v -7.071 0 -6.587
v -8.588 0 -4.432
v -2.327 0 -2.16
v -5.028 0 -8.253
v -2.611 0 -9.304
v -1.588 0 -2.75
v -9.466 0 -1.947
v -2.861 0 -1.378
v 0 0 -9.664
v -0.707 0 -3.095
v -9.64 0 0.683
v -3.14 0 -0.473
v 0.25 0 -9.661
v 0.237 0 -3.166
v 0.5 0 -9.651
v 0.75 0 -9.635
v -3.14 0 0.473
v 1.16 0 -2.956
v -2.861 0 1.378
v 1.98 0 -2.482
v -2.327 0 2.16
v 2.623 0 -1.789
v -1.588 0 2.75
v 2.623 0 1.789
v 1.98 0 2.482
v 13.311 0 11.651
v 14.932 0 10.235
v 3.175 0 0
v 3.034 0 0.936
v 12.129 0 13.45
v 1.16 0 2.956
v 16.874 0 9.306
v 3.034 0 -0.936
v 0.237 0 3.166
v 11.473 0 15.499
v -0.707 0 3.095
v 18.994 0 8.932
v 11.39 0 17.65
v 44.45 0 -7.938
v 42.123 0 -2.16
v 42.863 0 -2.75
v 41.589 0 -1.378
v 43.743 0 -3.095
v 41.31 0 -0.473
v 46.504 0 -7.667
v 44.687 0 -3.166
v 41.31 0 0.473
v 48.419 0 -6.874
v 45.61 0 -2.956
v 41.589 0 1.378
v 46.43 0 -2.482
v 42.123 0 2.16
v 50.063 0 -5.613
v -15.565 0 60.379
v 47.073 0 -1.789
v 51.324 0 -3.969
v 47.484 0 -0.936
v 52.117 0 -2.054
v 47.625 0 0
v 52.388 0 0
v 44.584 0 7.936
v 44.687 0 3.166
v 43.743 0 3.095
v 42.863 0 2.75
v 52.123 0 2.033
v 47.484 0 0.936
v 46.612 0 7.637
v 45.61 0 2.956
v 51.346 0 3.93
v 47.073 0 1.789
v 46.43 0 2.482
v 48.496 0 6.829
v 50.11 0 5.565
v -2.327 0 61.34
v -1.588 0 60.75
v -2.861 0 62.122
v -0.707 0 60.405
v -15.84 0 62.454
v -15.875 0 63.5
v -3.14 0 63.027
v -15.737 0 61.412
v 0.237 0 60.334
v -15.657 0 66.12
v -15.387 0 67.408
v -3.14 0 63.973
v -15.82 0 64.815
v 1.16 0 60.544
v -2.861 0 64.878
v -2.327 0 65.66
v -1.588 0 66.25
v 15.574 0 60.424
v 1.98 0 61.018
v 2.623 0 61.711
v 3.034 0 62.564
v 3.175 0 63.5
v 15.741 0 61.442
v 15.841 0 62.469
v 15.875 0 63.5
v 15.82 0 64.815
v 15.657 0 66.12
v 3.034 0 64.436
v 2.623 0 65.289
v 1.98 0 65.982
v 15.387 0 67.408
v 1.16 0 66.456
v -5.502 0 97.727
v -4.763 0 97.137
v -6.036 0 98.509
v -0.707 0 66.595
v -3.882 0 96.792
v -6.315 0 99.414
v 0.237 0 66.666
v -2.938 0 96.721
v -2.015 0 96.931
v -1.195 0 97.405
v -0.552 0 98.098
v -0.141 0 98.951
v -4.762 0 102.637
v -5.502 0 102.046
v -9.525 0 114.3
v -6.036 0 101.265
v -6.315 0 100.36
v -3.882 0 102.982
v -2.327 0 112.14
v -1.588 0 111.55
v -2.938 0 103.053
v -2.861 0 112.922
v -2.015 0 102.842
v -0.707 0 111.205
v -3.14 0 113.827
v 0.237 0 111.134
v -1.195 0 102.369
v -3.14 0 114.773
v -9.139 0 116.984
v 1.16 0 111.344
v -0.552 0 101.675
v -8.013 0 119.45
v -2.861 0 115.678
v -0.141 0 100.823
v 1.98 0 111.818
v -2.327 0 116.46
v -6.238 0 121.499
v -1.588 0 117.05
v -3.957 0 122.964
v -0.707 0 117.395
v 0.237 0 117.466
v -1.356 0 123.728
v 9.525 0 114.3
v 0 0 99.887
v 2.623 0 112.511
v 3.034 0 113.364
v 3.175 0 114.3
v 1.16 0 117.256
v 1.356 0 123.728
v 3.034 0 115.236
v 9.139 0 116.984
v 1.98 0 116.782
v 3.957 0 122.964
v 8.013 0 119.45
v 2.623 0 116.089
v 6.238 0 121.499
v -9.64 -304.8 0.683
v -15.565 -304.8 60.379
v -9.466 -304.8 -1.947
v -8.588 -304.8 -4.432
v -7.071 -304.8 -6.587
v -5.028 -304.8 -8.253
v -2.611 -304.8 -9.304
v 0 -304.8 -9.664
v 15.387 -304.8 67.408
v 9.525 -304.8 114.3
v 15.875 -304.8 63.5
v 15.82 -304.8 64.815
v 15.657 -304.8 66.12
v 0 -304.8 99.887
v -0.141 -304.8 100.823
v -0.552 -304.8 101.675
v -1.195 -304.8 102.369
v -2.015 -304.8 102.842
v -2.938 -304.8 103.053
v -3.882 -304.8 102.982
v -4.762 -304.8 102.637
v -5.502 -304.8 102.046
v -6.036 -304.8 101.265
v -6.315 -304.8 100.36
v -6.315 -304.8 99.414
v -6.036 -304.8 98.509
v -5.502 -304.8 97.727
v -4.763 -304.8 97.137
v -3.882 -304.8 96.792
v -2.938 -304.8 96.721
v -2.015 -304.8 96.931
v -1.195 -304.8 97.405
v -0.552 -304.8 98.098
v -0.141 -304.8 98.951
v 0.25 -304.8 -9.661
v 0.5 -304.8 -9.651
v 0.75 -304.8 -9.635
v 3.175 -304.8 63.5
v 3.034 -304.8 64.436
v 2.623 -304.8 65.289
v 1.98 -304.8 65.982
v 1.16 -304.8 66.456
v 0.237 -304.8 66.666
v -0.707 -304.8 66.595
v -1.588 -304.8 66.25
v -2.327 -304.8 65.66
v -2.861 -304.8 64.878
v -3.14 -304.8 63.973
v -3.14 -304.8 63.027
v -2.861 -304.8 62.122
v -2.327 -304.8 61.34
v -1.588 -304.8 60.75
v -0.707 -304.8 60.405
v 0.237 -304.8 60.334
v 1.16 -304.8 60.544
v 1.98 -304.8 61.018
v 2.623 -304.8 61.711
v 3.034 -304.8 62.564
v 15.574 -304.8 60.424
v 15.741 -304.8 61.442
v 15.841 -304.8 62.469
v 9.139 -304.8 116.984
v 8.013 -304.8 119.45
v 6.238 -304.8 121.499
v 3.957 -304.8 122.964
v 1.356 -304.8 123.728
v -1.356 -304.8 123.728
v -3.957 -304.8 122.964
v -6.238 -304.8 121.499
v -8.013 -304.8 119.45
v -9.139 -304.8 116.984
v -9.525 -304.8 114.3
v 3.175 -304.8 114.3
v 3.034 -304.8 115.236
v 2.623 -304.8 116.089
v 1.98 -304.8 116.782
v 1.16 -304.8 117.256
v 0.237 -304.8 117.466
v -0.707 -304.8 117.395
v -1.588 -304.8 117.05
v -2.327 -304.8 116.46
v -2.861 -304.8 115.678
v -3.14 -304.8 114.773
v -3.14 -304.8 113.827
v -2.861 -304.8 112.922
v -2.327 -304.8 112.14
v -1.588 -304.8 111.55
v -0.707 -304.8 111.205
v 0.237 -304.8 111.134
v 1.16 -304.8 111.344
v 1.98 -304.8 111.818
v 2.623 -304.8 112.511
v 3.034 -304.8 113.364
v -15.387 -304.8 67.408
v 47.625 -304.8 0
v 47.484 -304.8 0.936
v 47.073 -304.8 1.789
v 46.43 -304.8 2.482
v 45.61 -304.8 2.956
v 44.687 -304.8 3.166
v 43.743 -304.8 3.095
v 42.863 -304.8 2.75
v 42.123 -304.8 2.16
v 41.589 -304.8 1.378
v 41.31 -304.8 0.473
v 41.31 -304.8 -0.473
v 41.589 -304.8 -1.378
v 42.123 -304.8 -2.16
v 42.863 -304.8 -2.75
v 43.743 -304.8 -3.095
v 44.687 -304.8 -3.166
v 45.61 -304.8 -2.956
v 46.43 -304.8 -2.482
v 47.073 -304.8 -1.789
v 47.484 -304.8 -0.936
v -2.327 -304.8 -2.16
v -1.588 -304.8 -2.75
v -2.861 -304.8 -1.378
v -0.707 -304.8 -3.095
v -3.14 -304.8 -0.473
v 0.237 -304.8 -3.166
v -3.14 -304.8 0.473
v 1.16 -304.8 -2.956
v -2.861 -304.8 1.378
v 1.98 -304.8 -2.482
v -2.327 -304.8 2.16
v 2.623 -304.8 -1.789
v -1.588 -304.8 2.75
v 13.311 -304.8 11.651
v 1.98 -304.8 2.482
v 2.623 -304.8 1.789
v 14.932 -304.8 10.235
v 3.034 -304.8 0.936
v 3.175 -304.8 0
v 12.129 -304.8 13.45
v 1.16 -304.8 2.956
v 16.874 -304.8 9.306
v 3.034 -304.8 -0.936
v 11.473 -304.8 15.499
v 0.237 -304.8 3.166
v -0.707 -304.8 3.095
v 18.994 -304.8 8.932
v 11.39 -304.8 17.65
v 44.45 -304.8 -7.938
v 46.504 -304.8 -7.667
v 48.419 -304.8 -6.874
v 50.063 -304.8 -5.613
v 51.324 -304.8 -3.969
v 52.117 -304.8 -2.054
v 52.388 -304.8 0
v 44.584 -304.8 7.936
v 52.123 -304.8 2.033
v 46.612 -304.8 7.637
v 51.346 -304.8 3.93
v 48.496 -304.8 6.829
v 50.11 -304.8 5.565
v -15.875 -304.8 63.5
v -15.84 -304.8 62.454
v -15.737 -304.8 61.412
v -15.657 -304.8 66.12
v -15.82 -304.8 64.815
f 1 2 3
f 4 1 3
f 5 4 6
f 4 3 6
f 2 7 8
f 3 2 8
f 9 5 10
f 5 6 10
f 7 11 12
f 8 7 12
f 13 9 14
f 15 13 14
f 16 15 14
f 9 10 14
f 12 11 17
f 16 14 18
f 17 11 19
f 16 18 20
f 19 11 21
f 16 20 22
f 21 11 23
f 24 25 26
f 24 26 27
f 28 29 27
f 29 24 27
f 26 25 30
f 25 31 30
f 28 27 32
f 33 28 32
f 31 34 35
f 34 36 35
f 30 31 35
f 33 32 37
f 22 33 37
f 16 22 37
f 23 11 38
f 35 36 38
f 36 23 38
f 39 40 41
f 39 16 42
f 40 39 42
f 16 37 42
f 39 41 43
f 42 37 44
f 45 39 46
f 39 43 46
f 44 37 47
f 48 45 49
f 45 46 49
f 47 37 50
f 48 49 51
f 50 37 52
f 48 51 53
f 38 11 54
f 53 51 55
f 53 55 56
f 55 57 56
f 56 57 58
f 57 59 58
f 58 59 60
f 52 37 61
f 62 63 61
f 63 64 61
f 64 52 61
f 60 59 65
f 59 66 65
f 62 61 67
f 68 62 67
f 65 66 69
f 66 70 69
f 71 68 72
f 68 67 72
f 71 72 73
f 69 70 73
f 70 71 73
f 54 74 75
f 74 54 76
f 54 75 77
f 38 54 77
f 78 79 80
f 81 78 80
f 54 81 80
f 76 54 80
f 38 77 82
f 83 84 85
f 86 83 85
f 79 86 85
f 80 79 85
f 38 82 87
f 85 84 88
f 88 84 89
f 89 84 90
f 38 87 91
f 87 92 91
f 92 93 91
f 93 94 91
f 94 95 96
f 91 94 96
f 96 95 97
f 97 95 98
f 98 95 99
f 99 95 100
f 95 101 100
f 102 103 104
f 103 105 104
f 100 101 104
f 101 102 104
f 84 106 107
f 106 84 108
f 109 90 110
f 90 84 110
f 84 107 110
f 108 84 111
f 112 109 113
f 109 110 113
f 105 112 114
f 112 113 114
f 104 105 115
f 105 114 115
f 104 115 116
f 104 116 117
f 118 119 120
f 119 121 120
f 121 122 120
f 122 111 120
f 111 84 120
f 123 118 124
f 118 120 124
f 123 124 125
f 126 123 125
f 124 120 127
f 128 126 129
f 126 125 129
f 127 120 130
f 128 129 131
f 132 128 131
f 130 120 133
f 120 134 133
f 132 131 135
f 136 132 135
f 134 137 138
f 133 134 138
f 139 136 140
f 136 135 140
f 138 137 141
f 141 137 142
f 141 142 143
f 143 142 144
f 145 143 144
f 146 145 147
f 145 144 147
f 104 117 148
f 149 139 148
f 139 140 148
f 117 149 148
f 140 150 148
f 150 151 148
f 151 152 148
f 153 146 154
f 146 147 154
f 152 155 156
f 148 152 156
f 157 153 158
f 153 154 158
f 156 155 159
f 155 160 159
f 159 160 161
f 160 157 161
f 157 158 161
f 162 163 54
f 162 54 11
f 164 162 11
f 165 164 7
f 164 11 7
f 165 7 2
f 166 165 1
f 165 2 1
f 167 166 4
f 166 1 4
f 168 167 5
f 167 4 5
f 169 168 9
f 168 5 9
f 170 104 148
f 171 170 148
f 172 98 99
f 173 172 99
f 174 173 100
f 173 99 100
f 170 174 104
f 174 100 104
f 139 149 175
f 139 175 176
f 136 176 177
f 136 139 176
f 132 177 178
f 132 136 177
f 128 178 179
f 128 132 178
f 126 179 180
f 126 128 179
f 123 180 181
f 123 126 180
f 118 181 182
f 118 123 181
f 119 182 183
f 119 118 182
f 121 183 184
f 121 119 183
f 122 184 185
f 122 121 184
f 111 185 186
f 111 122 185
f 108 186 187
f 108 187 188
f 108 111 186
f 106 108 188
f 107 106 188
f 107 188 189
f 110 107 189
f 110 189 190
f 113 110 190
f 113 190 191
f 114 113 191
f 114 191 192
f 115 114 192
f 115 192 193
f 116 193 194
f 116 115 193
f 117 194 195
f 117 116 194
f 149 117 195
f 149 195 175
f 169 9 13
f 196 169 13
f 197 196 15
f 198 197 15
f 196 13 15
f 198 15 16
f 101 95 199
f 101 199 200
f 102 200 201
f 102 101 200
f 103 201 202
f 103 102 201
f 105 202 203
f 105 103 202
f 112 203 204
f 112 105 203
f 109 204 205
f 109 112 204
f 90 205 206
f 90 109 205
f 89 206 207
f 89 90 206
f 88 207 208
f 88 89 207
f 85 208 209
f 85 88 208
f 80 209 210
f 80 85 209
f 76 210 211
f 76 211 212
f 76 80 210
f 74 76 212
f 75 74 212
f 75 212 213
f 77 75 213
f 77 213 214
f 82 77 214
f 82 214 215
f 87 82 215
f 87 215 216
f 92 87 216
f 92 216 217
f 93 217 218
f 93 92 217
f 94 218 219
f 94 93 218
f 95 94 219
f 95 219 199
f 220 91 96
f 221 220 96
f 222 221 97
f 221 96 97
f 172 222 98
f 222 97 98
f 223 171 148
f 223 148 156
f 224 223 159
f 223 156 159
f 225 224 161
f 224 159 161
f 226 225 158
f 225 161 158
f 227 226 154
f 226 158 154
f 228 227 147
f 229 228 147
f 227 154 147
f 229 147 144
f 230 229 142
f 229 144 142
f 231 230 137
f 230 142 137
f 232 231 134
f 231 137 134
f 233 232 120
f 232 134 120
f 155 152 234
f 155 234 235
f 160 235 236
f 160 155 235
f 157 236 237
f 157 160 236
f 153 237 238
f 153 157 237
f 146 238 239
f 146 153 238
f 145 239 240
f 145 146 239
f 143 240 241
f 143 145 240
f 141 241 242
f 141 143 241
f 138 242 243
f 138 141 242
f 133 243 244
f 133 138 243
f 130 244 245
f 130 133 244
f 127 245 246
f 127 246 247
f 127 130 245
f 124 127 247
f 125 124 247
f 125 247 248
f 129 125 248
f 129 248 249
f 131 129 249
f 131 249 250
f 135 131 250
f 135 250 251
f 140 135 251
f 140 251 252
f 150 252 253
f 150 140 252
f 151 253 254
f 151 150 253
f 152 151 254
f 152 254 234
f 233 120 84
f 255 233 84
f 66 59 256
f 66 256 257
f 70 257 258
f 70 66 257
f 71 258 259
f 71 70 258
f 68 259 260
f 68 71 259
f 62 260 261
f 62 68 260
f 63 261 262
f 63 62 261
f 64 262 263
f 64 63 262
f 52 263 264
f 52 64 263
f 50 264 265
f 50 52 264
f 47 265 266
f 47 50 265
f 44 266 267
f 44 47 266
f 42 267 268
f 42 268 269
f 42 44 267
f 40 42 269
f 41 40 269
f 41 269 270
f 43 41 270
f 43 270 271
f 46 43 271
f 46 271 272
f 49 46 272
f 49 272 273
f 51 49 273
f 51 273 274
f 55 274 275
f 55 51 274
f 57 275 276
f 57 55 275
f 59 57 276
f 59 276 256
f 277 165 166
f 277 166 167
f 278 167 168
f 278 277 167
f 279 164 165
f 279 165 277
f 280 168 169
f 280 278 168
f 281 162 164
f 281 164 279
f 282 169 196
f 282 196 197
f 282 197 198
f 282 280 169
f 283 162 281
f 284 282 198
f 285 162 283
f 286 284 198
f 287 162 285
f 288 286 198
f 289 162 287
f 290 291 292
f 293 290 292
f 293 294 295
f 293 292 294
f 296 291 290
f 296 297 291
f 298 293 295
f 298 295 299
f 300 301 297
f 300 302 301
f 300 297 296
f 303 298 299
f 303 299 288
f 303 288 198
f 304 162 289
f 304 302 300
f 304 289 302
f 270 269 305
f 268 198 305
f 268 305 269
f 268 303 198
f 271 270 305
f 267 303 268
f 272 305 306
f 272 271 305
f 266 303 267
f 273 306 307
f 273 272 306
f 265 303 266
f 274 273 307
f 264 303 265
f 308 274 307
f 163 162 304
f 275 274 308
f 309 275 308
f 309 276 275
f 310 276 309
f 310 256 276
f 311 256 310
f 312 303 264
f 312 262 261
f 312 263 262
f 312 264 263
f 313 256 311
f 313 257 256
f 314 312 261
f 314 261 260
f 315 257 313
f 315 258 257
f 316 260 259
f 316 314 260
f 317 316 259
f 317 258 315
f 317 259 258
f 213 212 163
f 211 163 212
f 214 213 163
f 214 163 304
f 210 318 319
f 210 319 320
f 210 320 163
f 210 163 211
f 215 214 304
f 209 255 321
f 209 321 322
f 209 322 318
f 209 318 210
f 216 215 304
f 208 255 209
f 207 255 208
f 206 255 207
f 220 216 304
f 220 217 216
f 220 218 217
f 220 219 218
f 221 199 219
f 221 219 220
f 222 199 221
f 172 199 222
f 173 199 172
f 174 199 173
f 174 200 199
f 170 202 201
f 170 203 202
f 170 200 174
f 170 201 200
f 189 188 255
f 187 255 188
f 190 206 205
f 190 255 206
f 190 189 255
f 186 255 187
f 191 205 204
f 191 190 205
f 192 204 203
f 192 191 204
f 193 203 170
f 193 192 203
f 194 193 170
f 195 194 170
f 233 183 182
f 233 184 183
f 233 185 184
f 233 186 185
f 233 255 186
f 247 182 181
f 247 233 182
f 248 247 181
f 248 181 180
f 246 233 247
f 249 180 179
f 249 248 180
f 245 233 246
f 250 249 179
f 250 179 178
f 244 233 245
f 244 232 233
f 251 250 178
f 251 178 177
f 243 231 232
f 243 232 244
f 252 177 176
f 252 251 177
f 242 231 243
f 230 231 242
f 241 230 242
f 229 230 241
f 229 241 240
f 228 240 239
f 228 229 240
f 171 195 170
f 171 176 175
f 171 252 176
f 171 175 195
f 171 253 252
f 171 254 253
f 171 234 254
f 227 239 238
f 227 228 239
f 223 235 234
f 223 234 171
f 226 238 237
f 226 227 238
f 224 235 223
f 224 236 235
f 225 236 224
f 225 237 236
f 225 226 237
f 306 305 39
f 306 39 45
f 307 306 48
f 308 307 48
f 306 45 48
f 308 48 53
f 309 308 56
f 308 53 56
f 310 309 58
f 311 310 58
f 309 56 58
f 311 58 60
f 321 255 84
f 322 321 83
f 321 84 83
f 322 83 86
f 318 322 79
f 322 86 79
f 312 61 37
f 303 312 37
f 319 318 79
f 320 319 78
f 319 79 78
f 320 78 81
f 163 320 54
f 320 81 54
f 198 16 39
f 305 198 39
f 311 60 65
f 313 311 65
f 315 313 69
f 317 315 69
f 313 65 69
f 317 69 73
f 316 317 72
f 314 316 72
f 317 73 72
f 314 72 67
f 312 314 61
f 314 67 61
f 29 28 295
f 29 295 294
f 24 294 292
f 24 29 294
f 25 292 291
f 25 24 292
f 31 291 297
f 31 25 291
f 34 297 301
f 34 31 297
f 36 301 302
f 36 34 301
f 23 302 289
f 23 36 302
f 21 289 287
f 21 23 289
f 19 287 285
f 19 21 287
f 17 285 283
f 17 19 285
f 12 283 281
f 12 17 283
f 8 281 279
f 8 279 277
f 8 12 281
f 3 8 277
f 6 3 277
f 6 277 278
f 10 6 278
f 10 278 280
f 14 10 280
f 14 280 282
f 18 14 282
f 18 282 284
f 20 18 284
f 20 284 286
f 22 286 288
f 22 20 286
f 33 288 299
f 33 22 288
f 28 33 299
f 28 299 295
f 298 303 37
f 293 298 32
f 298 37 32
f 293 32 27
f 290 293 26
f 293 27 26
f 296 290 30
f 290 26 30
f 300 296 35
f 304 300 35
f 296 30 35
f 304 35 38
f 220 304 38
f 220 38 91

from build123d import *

# Parameters (mm, degrees)
F0_R     = 3.175
F1_DEPTH = 304.8


with BuildPart() as f1:
    # F0 (on Front) → F1 (new body)
    with BuildSketch(Plane.XZ):
        with BuildLine():
            ThreePointArc((-9.525, 114.3), (0, 104.775), (9.525, 114.3))
            ThreePointArc((9.525, 114.3), (0, 123.825), (-9.525, 114.3))
        make_face()
        with Locations((0, 114.3)):
            Circle(F0_R, mode=Mode.SUBTRACT)
        with BuildLine():
            Line((15.3865384615, 67.4076923077), (9.525, 114.3))
            ThreePointArc((9.525, 114.3), (0, 104.775), (-9.525, 114.3))
            Line((-9.525, 114.3), (-15.3865384615, 67.4076923077))
            ThreePointArc((-15.3865384615, 67.4076923077), (0, 79.375), (15.3865384615, 67.4076923077))
        make_face()
        with Locations((-3.175, 99.886942851)):
            Circle(F0_R, mode=Mode.SUBTRACT)
        with BuildLine():
            Line((15.875, 63.5), (15.3865384615, 67.4076923077))
            ThreePointArc((15.3865384615, 67.4076923077), (0, 79.375), (-15.3865384615, 67.4076923077))
            Line((-15.3865384615, 67.4076923077), (-15.875, 63.5))
            Line((-15.875, 63.5), (-15.5652161214, 60.3791552277))
            ThreePointArc((-15.5652161214, 60.3791552277), (0.0227867429, 47.6250163539), (15.5741112031, 60.4238522089))
            Line((15.5741112031, 60.4238522089), (15.875, 63.5))
        make_face()
        with Locations((0, 63.5)):
            Circle(F0_R, mode=Mode.SUBTRACT)
        with BuildLine():
            ThreePointArc((15.875, 63.5), (15.7524112928, 65.4690514116), (15.3865384615, 67.4076923077))
            Line((15.3865384615, 67.4076923077), (15.875, 63.5))
        make_face()
        with BuildLine():
            Line((-15.875, 63.5), (-15.3865384615, 67.4076923077))
            ThreePointArc((-15.3865384615, 67.4076923077), (-15.7524112928, 65.4690514116), (-15.875, 63.5))
        make_face()
        with BuildLine():
            ThreePointArc((15.5741112031, 60.4238522089), (15.7995987346, 61.9545858726), (15.875, 63.5))
            Line((15.875, 63.5), (15.5741112031, 60.4238522089))
        make_face()
        with BuildLine():
            Line((-15.5652161214, 60.3791552277), (-15.875, 63.5))
            ThreePointArc((-15.875, 63.5), (-15.7973641936, 61.9319089516), (-15.5652161214, 60.3791552277))
        make_face()
        with BuildLine():
            Line((11.3902740501, 17.6502376701), (15.5741112031, 60.4238522089))
            ThreePointArc((15.5741112031, 60.4238522089), (0.0227867429, 47.6250163539), (-15.5652161214, 60.3791552277))
            Line((-15.5652161214, 60.3791552277), (-9.6396474759, 0.683408579))
            ThreePointArc((-9.6396474759, 0.683408579), (0.3419183682, 9.6577918064), (9.6638424421, 0))
            ThreePointArc((9.6638424421, 0), (7.0934141051, -6.5630272801), (0.7495151779, -9.6347328839))
            Line((0.7495151779, -9.6347328839), (44.45, -7.9375))
            ThreePointArc((44.45, -7.9375), (36.5127834119, 0.0670752079), (44.584145626, 7.9363663727))
            Line((44.584145626, 7.9363663727), (18.9936011902, 8.9321058415))
            ThreePointArc((18.9936011902, 8.9321058415), (13.311058011, 11.650803927), (11.3902740501, 17.6502376701))
        make_face()
        with BuildLine():
            ThreePointArc((9.6638424421, 0), (0.3419183682, 9.6577918064), (-9.6396474759, 0.683408579))
            ThreePointArc((-9.6396474759, 0.683408579), (-7.0708628744, -6.5873172808), (0, -9.6638424421))
            Line((0, -9.6638424421), (0.7495151779, -9.6347328839))
            ThreePointArc((0.7495151779, -9.6347328839), (7.0934141051, -6.5630272801), (9.6638424421, 0))
        make_face()
        Circle(F0_R, mode=Mode.SUBTRACT)
        with BuildLine():
            Line((0.7495151779, -9.6347328839), (0, -9.6638424421))
            ThreePointArc((0, -9.6638424421), (0.3750401206, -9.6565623104), (0.7495151779, -9.6347328839))
        make_face()
        with BuildLine():
            ThreePointArc((52.3875, 0), (50.1098890076, 5.5650303388), (44.584145626, 7.9363663727))
            ThreePointArc((44.584145626, 7.9363663727), (36.5127834119, 0.0670752079), (44.45, -7.9375))
            ThreePointArc((44.45, -7.9375), (50.0626600757, -5.6126600757), (52.3875, 0))
        make_face()
        with Locations((44.45, 0)):
            Circle(F0_R, mode=Mode.SUBTRACT)
    extrude(amount=F1_DEPTH)


solid = f1.part
